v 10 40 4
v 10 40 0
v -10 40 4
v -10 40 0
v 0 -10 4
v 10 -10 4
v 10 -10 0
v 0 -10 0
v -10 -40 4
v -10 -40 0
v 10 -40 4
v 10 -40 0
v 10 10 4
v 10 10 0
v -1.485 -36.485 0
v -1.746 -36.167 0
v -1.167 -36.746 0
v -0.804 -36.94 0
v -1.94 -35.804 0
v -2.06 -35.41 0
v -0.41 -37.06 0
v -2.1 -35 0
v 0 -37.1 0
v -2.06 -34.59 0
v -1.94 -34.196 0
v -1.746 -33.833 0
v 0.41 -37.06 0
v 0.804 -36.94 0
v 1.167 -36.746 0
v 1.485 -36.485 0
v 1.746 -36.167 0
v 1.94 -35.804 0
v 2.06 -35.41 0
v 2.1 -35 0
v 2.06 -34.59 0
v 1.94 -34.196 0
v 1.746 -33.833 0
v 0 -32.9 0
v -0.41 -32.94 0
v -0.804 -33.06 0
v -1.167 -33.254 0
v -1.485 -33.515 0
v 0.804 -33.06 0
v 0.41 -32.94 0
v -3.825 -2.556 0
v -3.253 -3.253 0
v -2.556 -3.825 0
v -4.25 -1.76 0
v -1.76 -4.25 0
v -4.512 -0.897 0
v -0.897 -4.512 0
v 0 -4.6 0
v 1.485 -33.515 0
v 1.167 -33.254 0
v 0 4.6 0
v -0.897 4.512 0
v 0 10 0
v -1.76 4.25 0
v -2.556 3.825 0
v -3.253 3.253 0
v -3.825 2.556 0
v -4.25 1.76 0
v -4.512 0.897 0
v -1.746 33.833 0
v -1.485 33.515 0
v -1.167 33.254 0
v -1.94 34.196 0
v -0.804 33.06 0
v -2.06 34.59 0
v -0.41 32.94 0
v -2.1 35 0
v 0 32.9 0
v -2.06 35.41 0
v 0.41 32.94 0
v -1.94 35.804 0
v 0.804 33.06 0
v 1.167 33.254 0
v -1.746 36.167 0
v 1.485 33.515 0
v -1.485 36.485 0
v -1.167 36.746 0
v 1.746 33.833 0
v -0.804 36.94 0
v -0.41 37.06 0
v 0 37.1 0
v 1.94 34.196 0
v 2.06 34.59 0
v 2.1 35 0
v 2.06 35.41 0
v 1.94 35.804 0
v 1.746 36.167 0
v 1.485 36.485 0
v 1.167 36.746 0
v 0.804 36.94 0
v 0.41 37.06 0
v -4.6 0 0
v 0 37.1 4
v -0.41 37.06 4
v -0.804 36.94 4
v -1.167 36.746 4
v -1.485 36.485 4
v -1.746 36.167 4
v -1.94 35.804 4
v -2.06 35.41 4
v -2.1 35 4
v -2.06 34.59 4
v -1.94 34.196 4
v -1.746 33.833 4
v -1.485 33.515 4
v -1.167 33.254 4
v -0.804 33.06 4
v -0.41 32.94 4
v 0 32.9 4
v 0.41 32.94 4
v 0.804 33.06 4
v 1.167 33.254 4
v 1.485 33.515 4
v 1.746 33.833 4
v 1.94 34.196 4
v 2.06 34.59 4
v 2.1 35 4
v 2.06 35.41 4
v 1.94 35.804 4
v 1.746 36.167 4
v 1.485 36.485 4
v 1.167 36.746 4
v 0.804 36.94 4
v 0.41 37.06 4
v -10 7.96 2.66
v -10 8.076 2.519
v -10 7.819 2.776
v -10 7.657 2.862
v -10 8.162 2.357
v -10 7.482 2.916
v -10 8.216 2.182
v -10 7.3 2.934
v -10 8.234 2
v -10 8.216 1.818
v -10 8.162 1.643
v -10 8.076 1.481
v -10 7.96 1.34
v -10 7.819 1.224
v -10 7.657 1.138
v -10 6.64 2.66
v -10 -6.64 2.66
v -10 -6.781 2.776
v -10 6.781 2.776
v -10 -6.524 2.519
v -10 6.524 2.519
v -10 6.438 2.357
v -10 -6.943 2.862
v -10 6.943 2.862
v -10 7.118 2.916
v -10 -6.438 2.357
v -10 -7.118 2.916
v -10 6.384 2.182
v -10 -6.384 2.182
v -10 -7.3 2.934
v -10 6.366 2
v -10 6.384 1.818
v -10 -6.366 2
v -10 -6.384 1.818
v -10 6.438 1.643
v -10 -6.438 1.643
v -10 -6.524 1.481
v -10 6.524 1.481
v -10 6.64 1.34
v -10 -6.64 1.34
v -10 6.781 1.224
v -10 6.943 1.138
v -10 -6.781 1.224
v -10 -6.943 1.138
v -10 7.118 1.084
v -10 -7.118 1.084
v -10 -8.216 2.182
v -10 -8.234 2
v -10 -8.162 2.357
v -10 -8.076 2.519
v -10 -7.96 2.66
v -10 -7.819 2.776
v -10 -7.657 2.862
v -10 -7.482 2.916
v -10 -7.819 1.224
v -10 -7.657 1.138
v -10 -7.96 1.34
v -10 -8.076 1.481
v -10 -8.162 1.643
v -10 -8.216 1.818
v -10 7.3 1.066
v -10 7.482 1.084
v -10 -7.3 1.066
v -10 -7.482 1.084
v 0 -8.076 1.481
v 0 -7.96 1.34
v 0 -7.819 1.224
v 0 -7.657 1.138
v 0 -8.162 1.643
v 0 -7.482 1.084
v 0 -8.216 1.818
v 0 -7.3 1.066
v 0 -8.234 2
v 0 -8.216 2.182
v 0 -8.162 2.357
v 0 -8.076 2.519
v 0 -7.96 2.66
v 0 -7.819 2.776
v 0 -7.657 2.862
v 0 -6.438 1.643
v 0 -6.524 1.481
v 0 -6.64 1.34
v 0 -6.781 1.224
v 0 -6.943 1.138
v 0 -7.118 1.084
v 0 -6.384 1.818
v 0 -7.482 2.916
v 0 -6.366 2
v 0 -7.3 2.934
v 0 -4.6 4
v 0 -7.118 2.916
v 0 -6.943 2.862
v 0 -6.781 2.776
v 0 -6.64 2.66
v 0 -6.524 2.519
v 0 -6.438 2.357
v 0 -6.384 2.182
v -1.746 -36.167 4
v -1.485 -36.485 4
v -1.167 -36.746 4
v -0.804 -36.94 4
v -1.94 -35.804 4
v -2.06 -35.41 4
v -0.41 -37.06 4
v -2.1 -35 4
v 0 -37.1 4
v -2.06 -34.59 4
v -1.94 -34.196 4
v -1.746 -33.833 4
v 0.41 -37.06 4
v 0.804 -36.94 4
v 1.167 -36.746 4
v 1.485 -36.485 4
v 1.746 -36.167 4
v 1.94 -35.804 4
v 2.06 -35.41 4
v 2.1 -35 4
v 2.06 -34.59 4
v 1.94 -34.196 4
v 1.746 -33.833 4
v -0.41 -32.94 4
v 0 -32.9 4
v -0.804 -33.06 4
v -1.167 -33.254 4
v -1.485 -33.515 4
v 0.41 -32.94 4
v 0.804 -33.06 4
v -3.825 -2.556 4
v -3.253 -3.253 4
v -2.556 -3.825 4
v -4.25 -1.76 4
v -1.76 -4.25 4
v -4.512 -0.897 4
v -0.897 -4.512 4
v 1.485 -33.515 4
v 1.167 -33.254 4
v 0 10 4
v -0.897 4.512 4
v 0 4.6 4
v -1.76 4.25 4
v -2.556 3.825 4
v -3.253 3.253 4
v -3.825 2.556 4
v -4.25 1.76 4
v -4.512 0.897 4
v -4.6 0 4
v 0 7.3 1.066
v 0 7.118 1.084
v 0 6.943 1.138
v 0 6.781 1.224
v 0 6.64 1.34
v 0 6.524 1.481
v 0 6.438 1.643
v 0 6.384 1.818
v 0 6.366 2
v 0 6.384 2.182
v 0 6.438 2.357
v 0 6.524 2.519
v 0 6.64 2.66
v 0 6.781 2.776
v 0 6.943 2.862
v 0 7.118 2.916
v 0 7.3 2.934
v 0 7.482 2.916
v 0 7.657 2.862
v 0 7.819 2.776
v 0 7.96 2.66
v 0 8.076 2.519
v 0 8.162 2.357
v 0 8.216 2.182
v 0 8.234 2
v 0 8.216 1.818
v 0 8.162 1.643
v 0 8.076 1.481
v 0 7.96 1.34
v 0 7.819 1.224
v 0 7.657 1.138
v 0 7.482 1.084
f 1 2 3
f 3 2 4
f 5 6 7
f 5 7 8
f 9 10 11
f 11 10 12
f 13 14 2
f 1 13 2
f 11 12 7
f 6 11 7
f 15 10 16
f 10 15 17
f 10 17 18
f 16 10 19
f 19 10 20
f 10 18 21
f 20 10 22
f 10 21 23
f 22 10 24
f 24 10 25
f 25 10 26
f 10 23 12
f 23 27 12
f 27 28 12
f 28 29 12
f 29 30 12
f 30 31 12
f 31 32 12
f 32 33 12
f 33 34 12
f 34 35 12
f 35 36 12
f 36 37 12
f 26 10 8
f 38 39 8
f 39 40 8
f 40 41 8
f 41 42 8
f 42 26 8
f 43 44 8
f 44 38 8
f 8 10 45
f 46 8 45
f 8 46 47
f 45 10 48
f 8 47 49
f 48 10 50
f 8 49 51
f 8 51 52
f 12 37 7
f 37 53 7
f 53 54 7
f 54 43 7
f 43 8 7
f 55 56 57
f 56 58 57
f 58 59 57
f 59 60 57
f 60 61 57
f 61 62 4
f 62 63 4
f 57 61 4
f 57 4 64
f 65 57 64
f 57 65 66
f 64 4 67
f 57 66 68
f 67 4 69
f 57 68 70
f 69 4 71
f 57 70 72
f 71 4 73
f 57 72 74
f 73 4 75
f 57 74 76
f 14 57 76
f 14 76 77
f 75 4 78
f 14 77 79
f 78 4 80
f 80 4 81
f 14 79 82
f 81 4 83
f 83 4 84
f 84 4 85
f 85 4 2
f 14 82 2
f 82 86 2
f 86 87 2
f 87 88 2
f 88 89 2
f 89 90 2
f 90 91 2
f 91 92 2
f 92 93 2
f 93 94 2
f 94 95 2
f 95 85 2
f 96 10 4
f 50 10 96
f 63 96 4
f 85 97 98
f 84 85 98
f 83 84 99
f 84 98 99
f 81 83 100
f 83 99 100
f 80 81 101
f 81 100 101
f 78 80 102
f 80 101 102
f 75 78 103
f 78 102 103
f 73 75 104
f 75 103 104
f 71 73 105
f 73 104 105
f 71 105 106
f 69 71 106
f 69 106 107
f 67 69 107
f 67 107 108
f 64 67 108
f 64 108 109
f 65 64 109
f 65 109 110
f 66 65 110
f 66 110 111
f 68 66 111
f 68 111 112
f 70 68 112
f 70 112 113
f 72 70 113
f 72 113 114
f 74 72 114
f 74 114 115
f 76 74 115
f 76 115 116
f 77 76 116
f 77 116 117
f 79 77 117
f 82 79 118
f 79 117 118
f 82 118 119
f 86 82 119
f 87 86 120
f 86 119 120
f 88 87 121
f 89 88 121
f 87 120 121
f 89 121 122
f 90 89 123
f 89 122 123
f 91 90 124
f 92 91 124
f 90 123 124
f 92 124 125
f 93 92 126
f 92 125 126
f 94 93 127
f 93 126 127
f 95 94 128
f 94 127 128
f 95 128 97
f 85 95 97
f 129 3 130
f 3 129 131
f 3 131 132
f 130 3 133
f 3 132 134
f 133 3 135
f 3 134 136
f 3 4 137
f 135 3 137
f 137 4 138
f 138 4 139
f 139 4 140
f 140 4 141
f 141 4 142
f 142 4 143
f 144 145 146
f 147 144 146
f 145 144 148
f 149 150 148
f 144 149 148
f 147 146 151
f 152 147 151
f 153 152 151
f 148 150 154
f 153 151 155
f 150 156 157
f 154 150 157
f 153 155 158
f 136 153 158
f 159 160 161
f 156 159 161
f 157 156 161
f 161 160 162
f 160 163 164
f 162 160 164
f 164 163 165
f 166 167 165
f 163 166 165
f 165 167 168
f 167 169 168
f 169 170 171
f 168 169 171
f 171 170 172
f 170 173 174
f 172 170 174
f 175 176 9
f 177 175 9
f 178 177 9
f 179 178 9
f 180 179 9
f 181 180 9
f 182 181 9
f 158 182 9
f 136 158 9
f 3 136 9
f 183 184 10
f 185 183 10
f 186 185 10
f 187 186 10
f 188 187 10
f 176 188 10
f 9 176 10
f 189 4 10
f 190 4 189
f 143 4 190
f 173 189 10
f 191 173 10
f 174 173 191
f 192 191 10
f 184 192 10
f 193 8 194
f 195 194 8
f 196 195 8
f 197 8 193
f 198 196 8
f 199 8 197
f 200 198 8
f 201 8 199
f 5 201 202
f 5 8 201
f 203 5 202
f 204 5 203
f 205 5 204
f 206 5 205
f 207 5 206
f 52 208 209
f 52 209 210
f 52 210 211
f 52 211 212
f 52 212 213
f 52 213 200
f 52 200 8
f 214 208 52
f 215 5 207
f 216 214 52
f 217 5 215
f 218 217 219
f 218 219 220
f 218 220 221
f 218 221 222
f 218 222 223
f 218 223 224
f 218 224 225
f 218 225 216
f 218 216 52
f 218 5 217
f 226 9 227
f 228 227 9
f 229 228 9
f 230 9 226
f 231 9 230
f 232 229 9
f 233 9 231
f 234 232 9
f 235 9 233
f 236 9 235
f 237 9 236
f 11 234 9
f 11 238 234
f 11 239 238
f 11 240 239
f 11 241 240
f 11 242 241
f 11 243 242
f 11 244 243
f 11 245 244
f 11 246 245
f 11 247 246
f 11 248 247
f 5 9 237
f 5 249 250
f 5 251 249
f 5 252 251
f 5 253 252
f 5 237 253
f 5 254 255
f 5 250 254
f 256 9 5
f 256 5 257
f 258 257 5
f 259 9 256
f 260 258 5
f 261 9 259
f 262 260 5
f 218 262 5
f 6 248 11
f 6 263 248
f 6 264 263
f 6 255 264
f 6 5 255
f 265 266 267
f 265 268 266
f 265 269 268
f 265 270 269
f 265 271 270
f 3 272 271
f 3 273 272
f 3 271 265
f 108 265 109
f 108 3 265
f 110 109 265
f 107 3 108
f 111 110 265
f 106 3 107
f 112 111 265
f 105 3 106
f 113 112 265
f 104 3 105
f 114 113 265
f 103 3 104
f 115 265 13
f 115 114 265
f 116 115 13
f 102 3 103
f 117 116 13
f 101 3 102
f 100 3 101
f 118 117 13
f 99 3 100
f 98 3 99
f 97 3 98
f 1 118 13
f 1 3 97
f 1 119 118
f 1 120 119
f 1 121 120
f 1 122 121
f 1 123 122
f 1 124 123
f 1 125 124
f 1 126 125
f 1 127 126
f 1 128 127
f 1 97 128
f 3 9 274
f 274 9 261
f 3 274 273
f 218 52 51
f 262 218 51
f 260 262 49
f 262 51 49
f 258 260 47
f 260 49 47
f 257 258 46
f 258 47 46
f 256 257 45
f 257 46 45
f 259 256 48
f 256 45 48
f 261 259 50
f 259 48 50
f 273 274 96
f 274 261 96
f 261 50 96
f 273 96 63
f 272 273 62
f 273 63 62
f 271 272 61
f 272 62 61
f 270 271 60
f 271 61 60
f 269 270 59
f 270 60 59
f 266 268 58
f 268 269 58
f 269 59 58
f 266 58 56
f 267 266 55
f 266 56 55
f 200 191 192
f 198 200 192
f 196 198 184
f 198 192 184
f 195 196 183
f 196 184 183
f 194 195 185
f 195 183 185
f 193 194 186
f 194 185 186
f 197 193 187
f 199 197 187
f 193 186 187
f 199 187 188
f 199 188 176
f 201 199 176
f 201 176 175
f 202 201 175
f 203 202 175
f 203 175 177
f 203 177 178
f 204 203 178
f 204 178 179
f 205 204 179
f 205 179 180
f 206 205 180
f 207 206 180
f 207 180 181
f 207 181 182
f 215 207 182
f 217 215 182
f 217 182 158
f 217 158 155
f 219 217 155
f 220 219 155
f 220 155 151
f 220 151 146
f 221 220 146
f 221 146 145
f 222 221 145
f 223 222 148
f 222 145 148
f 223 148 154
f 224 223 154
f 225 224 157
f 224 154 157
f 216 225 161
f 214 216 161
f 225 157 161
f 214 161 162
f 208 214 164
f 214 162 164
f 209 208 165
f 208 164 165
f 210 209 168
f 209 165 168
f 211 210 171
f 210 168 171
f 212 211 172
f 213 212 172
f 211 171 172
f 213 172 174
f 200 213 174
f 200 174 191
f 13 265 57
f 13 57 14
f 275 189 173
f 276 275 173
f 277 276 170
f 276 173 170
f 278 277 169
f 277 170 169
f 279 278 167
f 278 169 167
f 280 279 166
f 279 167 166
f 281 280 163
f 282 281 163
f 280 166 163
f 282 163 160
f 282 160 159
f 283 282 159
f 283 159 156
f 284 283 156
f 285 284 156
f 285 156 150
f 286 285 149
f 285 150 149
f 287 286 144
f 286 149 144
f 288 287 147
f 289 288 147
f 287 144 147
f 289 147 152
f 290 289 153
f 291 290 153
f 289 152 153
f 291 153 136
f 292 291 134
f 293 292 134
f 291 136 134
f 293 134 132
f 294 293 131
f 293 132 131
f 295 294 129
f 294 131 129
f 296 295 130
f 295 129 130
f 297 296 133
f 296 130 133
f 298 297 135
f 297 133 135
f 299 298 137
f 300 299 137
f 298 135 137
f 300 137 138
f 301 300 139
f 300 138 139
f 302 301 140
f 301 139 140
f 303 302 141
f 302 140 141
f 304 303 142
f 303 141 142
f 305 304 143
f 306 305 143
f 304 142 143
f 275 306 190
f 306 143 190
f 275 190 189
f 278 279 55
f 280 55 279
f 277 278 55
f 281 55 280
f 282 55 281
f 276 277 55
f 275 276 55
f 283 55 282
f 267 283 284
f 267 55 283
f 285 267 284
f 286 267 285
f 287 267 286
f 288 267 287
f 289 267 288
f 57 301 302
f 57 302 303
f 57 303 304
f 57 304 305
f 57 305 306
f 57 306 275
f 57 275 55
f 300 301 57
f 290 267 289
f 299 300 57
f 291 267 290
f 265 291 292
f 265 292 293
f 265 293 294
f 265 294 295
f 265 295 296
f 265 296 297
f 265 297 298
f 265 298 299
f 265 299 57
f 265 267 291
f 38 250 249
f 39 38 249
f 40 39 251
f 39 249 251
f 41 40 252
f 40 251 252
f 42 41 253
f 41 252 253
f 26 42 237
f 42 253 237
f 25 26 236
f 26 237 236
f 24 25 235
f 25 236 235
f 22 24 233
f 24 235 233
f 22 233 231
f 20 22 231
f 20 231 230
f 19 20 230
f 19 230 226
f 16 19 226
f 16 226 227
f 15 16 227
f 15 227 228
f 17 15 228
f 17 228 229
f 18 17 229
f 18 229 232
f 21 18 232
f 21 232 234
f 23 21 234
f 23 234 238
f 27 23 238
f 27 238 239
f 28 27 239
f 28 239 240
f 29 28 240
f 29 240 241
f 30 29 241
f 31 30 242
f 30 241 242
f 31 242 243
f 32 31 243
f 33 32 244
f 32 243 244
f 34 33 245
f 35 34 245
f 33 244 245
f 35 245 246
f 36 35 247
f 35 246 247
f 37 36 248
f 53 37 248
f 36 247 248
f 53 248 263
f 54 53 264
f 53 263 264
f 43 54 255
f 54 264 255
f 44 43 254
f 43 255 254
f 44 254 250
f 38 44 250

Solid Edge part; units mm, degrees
sketch "Sketch1" plane through (0, 0, 0) normal (0, 0, 1) x (1, 0, 0)
  line L0 (-10, -40) -> (10, -40)
  line L1 (10, -40) -> (10, 40)
  line L2 (10, 40) -> (-10, 40)
  line L3 (-10, 40) -> (-10, -40)
  circle A0 centre (0, 0) radius 4.6
  dimension "D1" = 80
  dimension "D2" = 20
extrude "Protrusion1" add sketch "Sketch1" along normal blind 4
sketch "Sketch2" plane through (0, 0, 4) normal (0, 0, 1) x (1, 0, 0)
  line L0 (0, 10) -> (10, 10)
  line L1 (10, 10) -> (10, -10)
  line L2 (10, -10) -> (0, -10)
  line L3 (0, -10) -> (0, 10)
  dimension "D1" = 20
  dimension "D2" = 10
extrude "Cutout1" cut sketch "Sketch2" against normal up to next
sketch "Sketch3" plane through (0, 0, 4) normal (0, 0, 1) x (0, 1, 0)
  circle A0 centre (35, 0) radius 2.1
  circle A1 centre (-35, 0) radius 2.1
  dimension "D1" = 70
  dimension "D2" = 35
extrude "Cutout2" cut sketch "Sketch3" against normal up to next
hole "Hole_1" at (0, 7.3, 2) direction (-1, 0, 0) diameter 1.867 depth 10 thread major 2.3 thread length 8
hole "Hole1" at (0, -7.3, 2) direction (-1, 0, 0) diameter 1.867 depth 10 thread major 2.3 thread length 8
